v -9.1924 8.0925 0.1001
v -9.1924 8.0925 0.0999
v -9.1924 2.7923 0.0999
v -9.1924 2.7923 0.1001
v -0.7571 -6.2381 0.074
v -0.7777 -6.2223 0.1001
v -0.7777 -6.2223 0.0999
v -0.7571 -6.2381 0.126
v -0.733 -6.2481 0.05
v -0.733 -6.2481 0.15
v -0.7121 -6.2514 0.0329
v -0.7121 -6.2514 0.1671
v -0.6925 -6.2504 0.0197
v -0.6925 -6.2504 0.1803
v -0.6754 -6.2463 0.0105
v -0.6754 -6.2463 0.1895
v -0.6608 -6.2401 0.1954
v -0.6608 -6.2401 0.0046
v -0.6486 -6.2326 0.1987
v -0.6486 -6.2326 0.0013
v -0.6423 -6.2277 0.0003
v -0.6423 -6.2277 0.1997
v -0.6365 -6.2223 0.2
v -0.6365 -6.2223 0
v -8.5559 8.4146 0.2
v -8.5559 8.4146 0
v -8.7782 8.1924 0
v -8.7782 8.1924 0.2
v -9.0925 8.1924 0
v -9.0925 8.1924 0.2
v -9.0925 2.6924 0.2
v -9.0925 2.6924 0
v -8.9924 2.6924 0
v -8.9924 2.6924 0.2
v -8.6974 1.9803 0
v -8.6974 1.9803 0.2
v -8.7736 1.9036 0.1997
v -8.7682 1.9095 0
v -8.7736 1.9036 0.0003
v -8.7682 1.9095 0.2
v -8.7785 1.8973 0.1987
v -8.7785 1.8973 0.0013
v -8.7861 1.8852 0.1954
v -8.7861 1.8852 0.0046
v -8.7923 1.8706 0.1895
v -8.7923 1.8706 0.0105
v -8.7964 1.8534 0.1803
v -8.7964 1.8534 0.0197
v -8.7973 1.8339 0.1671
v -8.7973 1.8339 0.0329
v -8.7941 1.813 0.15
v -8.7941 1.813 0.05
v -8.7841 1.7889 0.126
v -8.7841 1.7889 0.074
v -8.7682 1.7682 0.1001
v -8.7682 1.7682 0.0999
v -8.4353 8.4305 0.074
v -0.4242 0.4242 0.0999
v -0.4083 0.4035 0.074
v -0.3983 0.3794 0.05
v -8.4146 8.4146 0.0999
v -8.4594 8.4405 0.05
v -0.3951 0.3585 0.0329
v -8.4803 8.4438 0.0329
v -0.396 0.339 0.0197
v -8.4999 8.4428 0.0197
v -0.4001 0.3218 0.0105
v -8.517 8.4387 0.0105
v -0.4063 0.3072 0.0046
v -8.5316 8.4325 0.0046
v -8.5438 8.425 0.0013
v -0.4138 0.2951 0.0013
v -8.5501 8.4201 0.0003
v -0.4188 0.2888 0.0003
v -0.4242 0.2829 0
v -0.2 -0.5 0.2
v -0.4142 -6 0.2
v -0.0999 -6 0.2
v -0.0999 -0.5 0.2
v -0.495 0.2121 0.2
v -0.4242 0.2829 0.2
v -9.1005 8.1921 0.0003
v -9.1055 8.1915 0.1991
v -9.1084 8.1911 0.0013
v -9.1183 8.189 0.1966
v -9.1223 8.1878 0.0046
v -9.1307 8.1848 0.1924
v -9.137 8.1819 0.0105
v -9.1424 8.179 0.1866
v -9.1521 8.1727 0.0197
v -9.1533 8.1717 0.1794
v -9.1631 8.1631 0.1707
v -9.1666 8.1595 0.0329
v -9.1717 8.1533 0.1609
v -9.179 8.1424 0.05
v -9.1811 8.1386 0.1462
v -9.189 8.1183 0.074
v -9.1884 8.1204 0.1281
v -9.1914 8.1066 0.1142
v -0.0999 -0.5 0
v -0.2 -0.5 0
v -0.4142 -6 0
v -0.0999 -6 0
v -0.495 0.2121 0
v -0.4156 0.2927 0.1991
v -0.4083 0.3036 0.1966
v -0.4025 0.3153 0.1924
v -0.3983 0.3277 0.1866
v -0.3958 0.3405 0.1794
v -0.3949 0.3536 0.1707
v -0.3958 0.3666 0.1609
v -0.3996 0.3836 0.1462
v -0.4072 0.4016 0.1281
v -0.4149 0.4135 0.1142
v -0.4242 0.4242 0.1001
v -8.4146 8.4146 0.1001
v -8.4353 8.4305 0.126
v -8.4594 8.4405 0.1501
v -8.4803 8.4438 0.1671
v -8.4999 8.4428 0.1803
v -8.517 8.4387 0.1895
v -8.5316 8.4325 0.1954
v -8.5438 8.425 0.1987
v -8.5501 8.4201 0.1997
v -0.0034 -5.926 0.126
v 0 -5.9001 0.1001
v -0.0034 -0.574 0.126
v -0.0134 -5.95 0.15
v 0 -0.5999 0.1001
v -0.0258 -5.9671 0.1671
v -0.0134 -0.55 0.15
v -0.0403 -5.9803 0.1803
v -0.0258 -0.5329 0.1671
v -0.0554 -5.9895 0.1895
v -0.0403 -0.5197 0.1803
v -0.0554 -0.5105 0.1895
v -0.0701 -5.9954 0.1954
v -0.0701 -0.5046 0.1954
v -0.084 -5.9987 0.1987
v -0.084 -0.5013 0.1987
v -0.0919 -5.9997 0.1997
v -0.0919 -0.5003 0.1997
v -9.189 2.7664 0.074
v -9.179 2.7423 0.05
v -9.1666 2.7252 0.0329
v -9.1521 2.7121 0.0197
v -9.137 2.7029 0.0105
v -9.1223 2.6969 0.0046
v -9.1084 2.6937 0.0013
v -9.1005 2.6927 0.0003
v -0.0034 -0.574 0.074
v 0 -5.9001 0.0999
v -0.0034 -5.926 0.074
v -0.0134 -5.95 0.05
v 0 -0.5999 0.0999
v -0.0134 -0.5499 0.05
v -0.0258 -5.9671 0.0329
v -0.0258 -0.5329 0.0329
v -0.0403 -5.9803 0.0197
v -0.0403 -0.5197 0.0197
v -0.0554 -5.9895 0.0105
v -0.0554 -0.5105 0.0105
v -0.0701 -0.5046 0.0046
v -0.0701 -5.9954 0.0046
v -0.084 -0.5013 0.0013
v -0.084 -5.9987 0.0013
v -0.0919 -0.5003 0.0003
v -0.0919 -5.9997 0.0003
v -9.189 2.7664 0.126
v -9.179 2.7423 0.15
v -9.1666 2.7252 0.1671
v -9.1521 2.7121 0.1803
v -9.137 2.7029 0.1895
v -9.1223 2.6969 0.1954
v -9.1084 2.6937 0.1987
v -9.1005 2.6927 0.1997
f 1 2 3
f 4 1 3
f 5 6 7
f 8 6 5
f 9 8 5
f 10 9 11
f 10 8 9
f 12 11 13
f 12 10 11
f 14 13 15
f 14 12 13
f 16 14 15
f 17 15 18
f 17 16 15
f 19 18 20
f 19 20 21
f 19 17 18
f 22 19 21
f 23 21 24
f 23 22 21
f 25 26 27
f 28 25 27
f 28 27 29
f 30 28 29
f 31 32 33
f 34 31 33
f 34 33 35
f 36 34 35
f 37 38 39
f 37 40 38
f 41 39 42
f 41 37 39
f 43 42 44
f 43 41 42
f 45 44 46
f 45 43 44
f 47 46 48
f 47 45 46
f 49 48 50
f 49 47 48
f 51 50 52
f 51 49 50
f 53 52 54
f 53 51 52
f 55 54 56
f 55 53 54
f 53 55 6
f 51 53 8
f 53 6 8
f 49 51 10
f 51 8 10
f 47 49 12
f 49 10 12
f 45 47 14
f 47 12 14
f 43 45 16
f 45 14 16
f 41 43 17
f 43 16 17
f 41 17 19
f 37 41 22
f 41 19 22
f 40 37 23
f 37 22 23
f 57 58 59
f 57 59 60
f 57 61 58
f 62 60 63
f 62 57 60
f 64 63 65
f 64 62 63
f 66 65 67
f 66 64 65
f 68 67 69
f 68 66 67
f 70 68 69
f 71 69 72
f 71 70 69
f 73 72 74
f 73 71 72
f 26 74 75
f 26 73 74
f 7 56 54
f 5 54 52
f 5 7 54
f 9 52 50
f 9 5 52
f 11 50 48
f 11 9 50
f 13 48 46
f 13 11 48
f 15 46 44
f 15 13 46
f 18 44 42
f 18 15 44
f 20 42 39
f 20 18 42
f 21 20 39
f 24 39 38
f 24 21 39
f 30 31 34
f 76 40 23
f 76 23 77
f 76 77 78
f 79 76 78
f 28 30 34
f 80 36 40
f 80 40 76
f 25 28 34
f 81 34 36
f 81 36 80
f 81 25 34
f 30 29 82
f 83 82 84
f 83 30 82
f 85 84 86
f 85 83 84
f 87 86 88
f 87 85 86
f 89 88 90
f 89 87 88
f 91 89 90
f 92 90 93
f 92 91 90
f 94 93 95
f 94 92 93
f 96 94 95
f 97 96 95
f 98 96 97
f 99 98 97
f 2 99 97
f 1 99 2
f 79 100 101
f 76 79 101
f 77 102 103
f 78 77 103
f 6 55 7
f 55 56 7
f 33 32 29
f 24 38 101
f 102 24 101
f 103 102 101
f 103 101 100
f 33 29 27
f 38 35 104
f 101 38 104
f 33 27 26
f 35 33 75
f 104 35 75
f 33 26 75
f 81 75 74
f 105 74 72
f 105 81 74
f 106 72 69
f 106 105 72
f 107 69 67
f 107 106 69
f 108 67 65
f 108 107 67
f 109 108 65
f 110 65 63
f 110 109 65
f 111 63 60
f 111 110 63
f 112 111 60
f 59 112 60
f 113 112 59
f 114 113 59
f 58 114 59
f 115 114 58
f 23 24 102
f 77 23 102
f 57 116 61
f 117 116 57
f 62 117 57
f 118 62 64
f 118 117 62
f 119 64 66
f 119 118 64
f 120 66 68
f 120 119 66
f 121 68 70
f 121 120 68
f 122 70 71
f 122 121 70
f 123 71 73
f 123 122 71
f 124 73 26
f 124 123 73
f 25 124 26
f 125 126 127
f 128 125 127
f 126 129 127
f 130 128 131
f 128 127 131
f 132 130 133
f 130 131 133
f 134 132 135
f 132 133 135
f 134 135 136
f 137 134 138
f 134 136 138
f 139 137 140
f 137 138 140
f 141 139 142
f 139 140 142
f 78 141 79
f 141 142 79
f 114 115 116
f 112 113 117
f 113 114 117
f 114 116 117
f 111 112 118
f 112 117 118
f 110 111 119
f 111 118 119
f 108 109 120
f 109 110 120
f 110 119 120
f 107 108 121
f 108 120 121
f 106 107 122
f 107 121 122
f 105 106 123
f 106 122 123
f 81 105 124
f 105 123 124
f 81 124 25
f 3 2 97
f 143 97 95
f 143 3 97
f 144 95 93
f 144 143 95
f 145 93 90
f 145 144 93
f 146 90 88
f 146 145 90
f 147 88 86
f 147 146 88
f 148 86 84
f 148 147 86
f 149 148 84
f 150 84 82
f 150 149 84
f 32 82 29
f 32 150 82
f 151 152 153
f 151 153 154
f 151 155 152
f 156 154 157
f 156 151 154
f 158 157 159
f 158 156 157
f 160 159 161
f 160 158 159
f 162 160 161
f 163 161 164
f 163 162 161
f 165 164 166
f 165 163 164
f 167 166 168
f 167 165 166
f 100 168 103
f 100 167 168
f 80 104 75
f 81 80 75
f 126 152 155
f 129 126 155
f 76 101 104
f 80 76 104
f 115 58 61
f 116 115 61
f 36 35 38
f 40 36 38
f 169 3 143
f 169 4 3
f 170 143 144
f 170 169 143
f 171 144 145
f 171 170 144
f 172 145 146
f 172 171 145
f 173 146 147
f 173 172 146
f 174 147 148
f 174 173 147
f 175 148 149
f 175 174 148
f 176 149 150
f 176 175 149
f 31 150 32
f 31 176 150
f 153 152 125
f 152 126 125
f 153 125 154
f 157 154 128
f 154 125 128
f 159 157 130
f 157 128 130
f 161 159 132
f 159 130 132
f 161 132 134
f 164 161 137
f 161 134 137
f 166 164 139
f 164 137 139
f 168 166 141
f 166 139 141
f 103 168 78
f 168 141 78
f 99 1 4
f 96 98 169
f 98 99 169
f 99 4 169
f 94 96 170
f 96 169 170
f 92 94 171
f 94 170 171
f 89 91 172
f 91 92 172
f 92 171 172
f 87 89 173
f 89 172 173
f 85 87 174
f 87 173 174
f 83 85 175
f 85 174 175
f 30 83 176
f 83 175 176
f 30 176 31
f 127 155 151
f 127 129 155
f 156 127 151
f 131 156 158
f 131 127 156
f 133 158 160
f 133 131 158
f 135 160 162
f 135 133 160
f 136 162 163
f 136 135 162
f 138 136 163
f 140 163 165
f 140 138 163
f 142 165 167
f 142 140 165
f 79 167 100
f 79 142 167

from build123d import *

# Parameters (mm, degrees)
EXTRUDE_1_DEPTH = 0.2
FILLET_1_R      = 0.1


with BuildPart() as part:
    # 草图1 → 凸台-拉伸1 (new body)
    with BuildSketch(Plane.XY):
        Polygon((0, -6), (0, -0.5), (-0.2, -0.5), (-0.494974747, 0.212132034), (-0.353553391, 0.353553391), (-8.485281374, 8.485281374), (-8.778174593, 8.192388155), (-9.192388155, 8.192388155), (-9.192388155, 2.692388155), (-8.992388155, 2.692388155), (-8.697413409, 1.980256121), (-8.838834765, 1.838834765), (-0.707106781, -6.292893219), (-0.414213562, -6), align=None)
    extrude(amount=EXTRUDE_1_DEPTH)

    # 圆角1
    fillet_1_edges = [part.edges().sort_by_distance(p)[0] for p in [
        (-9.192388155, 5.442388155, 0),
        (-4.419417382, 4.419417382, 0),
        (-4.772970773, -2.227029227, 0.2),
        (0, -3.25, 0),
        (-4.772970773, -2.227029227, 0),
        (-9.192388155, 2.692388155, 0.1),
        (-9.192388155, 8.192388155, 0.1),
        (-8.485281374, 8.485281374, 0.1),
        (-0.353553391, 0.353553391, 0.1),
        (0, -0.5, 0.1),
        (0, -6, 0.1),
        (-0.707106781, -6.292893219, 0.1),
        (-8.838834765, 1.838834765, 0.1),
        (0, -3.25, 0.2),
        (-4.419417382, 4.419417382, 0.2),
        (-9.192388155, 5.442388155, 0.2),
    ]]
    fillet(fillet_1_edges, radius=FILLET_1_R - 0.0001)  # a hair under: the kernel refuses the full size


solid = part.part
